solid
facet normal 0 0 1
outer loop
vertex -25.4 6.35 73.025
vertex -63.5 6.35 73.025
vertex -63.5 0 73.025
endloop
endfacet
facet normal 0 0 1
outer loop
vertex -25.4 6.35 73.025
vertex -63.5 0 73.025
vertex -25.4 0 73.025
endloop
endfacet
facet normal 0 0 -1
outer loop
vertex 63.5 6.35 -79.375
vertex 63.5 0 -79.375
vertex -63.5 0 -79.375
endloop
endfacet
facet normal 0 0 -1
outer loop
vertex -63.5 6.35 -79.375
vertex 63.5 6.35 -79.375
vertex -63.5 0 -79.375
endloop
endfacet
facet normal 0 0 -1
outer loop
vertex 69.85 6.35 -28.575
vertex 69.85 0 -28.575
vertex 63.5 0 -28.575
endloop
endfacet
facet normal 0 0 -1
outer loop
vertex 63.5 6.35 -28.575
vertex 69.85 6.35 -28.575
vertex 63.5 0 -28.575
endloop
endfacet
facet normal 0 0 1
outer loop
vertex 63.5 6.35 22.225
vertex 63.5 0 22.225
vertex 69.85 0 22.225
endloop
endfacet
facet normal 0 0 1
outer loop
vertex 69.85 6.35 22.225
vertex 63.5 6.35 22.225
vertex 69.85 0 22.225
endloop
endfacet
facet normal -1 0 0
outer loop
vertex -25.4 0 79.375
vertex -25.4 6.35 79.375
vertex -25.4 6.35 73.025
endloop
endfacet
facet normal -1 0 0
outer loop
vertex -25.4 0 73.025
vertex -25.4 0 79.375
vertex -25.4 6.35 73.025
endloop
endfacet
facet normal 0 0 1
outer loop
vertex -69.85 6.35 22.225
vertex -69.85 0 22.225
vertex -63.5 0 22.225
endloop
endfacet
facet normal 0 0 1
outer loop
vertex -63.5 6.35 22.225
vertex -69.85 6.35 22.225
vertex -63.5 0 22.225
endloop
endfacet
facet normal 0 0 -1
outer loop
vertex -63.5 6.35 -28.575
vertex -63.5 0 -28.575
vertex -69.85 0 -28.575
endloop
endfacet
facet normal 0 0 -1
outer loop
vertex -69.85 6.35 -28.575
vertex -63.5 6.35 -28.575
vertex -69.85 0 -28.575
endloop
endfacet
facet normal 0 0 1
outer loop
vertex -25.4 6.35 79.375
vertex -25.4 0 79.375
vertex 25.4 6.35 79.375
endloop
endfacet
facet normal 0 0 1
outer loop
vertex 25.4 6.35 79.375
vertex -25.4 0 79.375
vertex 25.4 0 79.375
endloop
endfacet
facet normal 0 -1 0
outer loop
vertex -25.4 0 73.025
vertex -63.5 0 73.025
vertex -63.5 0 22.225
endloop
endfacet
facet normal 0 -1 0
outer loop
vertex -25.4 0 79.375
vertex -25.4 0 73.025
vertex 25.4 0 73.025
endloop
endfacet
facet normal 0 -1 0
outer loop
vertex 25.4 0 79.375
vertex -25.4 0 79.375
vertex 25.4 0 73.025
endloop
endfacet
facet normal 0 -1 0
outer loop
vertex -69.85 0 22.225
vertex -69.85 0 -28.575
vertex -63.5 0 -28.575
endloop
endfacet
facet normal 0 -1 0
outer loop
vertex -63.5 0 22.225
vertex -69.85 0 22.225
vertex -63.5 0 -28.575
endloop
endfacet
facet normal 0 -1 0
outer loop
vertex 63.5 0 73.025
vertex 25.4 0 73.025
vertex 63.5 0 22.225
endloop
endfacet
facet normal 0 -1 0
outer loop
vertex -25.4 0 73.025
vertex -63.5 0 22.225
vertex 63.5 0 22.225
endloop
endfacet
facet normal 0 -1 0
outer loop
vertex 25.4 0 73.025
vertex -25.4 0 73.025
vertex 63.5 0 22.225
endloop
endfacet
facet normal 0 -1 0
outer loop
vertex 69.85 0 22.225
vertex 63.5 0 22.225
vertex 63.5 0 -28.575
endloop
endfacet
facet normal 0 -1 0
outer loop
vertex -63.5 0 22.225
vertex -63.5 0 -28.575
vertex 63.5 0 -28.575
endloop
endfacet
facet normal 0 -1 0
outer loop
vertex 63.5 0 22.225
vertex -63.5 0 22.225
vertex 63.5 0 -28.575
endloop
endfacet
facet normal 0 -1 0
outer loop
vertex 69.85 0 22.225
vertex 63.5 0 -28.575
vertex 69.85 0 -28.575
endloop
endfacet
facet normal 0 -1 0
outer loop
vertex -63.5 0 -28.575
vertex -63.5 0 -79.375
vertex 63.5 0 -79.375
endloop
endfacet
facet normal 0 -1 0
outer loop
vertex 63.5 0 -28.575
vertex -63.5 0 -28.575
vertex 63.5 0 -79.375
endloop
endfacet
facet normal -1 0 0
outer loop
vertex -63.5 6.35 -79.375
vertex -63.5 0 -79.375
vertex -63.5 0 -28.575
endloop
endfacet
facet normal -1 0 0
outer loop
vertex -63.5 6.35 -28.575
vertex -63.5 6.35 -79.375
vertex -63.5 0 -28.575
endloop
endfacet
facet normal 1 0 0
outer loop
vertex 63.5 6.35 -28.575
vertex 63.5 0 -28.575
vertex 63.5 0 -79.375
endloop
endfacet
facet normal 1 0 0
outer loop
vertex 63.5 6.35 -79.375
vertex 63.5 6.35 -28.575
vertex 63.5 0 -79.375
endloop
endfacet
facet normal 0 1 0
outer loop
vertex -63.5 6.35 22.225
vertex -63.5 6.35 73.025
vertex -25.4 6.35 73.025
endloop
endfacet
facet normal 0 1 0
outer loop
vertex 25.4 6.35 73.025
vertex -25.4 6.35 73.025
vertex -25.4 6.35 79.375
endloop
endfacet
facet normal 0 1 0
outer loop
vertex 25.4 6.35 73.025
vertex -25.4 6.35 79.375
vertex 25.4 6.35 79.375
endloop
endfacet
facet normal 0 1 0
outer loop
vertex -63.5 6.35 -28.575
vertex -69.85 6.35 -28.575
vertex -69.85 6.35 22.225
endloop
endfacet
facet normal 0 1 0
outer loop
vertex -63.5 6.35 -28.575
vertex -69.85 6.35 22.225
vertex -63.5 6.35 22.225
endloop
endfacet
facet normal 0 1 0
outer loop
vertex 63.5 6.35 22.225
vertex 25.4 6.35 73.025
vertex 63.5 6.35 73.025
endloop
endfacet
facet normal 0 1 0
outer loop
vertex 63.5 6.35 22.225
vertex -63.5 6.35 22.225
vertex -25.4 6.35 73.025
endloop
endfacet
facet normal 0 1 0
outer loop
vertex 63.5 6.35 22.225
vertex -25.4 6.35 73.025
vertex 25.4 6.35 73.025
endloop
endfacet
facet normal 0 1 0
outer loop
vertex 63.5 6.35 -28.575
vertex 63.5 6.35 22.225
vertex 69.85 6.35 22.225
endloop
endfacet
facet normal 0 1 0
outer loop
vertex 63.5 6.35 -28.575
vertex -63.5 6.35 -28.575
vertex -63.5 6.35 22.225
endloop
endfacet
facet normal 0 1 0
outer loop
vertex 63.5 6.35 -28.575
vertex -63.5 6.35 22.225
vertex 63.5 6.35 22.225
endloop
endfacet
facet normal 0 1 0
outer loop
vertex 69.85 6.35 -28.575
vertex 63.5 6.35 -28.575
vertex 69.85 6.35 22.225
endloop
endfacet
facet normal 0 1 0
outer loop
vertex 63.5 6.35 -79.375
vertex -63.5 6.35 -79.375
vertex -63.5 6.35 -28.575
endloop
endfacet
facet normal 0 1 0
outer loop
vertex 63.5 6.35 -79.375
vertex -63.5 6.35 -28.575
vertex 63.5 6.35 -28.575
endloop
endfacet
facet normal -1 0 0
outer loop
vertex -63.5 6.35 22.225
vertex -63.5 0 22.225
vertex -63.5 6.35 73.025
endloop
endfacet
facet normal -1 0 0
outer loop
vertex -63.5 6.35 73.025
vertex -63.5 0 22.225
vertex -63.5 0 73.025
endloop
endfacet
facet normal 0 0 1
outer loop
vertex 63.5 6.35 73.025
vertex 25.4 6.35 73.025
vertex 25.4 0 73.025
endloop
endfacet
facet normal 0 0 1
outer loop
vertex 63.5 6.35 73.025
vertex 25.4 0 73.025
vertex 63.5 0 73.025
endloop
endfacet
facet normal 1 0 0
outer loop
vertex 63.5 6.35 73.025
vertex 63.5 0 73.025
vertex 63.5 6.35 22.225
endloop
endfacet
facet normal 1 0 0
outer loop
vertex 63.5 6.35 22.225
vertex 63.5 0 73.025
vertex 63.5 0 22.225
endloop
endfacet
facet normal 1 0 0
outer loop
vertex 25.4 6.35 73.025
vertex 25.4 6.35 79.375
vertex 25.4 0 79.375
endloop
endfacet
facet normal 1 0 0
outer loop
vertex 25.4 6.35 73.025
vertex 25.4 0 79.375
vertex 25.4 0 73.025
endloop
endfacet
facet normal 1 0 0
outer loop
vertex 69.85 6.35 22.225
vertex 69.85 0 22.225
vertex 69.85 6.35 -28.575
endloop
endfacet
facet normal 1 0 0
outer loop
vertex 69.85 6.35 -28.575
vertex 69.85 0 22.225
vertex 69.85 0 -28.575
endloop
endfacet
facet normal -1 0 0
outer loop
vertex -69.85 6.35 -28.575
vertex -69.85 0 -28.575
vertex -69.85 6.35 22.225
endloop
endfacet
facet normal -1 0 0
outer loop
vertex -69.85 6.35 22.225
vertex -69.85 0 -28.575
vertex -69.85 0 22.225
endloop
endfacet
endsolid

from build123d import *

# Parameters (mm, degrees)
BOSS_EXTRUDE1_DEPTH     = 6.35
SKETCH2_W               = 38.1
SKETCH2_H               = 6.35
CUT_EXTRUDE1_DEPTH      = 6.35
CUT_EXTRUDE1_DEPTH_BACK = 13.97


with BuildPart() as part:
    # Sketch1 → Boss-Extrude1 (new body)
    with BuildSketch(Plane(origin=(0, 0, 0), x_dir=(1, 0, 0), z_dir=(0, 1, 0))):
        Polygon((-63.5, -79.375), (63.5, -79.375), (63.5, -22.225), (69.85, -22.225), (69.85, 28.575), (63.5, 28.575), (63.5, 79.375), (-63.5, 79.375), (-63.5, 28.575), (-69.85, 28.575), (-69.85, -22.225), (-63.5, -22.225), align=None)
    extrude(amount=BOSS_EXTRUDE1_DEPTH)

    # Sketch2 → Cut-Extrude1 (cut, two sides)
    with BuildSketch(Plane(origin=(0, 6.35, 0), x_dir=(1, 0, 0), z_dir=(0, 1, 0))) as cut_extrude1_sk:
        with Locations((-44.45, -76.2)):
            Rectangle(SKETCH2_W, SKETCH2_H)
        with Locations((44.45, -76.2)):
            Rectangle(SKETCH2_W, SKETCH2_H)
    extrude(amount=CUT_EXTRUDE1_DEPTH, mode=Mode.SUBTRACT)
    extrude(cut_extrude1_sk.sketch, amount=-CUT_EXTRUDE1_DEPTH_BACK, mode=Mode.SUBTRACT)


solid = part.part
